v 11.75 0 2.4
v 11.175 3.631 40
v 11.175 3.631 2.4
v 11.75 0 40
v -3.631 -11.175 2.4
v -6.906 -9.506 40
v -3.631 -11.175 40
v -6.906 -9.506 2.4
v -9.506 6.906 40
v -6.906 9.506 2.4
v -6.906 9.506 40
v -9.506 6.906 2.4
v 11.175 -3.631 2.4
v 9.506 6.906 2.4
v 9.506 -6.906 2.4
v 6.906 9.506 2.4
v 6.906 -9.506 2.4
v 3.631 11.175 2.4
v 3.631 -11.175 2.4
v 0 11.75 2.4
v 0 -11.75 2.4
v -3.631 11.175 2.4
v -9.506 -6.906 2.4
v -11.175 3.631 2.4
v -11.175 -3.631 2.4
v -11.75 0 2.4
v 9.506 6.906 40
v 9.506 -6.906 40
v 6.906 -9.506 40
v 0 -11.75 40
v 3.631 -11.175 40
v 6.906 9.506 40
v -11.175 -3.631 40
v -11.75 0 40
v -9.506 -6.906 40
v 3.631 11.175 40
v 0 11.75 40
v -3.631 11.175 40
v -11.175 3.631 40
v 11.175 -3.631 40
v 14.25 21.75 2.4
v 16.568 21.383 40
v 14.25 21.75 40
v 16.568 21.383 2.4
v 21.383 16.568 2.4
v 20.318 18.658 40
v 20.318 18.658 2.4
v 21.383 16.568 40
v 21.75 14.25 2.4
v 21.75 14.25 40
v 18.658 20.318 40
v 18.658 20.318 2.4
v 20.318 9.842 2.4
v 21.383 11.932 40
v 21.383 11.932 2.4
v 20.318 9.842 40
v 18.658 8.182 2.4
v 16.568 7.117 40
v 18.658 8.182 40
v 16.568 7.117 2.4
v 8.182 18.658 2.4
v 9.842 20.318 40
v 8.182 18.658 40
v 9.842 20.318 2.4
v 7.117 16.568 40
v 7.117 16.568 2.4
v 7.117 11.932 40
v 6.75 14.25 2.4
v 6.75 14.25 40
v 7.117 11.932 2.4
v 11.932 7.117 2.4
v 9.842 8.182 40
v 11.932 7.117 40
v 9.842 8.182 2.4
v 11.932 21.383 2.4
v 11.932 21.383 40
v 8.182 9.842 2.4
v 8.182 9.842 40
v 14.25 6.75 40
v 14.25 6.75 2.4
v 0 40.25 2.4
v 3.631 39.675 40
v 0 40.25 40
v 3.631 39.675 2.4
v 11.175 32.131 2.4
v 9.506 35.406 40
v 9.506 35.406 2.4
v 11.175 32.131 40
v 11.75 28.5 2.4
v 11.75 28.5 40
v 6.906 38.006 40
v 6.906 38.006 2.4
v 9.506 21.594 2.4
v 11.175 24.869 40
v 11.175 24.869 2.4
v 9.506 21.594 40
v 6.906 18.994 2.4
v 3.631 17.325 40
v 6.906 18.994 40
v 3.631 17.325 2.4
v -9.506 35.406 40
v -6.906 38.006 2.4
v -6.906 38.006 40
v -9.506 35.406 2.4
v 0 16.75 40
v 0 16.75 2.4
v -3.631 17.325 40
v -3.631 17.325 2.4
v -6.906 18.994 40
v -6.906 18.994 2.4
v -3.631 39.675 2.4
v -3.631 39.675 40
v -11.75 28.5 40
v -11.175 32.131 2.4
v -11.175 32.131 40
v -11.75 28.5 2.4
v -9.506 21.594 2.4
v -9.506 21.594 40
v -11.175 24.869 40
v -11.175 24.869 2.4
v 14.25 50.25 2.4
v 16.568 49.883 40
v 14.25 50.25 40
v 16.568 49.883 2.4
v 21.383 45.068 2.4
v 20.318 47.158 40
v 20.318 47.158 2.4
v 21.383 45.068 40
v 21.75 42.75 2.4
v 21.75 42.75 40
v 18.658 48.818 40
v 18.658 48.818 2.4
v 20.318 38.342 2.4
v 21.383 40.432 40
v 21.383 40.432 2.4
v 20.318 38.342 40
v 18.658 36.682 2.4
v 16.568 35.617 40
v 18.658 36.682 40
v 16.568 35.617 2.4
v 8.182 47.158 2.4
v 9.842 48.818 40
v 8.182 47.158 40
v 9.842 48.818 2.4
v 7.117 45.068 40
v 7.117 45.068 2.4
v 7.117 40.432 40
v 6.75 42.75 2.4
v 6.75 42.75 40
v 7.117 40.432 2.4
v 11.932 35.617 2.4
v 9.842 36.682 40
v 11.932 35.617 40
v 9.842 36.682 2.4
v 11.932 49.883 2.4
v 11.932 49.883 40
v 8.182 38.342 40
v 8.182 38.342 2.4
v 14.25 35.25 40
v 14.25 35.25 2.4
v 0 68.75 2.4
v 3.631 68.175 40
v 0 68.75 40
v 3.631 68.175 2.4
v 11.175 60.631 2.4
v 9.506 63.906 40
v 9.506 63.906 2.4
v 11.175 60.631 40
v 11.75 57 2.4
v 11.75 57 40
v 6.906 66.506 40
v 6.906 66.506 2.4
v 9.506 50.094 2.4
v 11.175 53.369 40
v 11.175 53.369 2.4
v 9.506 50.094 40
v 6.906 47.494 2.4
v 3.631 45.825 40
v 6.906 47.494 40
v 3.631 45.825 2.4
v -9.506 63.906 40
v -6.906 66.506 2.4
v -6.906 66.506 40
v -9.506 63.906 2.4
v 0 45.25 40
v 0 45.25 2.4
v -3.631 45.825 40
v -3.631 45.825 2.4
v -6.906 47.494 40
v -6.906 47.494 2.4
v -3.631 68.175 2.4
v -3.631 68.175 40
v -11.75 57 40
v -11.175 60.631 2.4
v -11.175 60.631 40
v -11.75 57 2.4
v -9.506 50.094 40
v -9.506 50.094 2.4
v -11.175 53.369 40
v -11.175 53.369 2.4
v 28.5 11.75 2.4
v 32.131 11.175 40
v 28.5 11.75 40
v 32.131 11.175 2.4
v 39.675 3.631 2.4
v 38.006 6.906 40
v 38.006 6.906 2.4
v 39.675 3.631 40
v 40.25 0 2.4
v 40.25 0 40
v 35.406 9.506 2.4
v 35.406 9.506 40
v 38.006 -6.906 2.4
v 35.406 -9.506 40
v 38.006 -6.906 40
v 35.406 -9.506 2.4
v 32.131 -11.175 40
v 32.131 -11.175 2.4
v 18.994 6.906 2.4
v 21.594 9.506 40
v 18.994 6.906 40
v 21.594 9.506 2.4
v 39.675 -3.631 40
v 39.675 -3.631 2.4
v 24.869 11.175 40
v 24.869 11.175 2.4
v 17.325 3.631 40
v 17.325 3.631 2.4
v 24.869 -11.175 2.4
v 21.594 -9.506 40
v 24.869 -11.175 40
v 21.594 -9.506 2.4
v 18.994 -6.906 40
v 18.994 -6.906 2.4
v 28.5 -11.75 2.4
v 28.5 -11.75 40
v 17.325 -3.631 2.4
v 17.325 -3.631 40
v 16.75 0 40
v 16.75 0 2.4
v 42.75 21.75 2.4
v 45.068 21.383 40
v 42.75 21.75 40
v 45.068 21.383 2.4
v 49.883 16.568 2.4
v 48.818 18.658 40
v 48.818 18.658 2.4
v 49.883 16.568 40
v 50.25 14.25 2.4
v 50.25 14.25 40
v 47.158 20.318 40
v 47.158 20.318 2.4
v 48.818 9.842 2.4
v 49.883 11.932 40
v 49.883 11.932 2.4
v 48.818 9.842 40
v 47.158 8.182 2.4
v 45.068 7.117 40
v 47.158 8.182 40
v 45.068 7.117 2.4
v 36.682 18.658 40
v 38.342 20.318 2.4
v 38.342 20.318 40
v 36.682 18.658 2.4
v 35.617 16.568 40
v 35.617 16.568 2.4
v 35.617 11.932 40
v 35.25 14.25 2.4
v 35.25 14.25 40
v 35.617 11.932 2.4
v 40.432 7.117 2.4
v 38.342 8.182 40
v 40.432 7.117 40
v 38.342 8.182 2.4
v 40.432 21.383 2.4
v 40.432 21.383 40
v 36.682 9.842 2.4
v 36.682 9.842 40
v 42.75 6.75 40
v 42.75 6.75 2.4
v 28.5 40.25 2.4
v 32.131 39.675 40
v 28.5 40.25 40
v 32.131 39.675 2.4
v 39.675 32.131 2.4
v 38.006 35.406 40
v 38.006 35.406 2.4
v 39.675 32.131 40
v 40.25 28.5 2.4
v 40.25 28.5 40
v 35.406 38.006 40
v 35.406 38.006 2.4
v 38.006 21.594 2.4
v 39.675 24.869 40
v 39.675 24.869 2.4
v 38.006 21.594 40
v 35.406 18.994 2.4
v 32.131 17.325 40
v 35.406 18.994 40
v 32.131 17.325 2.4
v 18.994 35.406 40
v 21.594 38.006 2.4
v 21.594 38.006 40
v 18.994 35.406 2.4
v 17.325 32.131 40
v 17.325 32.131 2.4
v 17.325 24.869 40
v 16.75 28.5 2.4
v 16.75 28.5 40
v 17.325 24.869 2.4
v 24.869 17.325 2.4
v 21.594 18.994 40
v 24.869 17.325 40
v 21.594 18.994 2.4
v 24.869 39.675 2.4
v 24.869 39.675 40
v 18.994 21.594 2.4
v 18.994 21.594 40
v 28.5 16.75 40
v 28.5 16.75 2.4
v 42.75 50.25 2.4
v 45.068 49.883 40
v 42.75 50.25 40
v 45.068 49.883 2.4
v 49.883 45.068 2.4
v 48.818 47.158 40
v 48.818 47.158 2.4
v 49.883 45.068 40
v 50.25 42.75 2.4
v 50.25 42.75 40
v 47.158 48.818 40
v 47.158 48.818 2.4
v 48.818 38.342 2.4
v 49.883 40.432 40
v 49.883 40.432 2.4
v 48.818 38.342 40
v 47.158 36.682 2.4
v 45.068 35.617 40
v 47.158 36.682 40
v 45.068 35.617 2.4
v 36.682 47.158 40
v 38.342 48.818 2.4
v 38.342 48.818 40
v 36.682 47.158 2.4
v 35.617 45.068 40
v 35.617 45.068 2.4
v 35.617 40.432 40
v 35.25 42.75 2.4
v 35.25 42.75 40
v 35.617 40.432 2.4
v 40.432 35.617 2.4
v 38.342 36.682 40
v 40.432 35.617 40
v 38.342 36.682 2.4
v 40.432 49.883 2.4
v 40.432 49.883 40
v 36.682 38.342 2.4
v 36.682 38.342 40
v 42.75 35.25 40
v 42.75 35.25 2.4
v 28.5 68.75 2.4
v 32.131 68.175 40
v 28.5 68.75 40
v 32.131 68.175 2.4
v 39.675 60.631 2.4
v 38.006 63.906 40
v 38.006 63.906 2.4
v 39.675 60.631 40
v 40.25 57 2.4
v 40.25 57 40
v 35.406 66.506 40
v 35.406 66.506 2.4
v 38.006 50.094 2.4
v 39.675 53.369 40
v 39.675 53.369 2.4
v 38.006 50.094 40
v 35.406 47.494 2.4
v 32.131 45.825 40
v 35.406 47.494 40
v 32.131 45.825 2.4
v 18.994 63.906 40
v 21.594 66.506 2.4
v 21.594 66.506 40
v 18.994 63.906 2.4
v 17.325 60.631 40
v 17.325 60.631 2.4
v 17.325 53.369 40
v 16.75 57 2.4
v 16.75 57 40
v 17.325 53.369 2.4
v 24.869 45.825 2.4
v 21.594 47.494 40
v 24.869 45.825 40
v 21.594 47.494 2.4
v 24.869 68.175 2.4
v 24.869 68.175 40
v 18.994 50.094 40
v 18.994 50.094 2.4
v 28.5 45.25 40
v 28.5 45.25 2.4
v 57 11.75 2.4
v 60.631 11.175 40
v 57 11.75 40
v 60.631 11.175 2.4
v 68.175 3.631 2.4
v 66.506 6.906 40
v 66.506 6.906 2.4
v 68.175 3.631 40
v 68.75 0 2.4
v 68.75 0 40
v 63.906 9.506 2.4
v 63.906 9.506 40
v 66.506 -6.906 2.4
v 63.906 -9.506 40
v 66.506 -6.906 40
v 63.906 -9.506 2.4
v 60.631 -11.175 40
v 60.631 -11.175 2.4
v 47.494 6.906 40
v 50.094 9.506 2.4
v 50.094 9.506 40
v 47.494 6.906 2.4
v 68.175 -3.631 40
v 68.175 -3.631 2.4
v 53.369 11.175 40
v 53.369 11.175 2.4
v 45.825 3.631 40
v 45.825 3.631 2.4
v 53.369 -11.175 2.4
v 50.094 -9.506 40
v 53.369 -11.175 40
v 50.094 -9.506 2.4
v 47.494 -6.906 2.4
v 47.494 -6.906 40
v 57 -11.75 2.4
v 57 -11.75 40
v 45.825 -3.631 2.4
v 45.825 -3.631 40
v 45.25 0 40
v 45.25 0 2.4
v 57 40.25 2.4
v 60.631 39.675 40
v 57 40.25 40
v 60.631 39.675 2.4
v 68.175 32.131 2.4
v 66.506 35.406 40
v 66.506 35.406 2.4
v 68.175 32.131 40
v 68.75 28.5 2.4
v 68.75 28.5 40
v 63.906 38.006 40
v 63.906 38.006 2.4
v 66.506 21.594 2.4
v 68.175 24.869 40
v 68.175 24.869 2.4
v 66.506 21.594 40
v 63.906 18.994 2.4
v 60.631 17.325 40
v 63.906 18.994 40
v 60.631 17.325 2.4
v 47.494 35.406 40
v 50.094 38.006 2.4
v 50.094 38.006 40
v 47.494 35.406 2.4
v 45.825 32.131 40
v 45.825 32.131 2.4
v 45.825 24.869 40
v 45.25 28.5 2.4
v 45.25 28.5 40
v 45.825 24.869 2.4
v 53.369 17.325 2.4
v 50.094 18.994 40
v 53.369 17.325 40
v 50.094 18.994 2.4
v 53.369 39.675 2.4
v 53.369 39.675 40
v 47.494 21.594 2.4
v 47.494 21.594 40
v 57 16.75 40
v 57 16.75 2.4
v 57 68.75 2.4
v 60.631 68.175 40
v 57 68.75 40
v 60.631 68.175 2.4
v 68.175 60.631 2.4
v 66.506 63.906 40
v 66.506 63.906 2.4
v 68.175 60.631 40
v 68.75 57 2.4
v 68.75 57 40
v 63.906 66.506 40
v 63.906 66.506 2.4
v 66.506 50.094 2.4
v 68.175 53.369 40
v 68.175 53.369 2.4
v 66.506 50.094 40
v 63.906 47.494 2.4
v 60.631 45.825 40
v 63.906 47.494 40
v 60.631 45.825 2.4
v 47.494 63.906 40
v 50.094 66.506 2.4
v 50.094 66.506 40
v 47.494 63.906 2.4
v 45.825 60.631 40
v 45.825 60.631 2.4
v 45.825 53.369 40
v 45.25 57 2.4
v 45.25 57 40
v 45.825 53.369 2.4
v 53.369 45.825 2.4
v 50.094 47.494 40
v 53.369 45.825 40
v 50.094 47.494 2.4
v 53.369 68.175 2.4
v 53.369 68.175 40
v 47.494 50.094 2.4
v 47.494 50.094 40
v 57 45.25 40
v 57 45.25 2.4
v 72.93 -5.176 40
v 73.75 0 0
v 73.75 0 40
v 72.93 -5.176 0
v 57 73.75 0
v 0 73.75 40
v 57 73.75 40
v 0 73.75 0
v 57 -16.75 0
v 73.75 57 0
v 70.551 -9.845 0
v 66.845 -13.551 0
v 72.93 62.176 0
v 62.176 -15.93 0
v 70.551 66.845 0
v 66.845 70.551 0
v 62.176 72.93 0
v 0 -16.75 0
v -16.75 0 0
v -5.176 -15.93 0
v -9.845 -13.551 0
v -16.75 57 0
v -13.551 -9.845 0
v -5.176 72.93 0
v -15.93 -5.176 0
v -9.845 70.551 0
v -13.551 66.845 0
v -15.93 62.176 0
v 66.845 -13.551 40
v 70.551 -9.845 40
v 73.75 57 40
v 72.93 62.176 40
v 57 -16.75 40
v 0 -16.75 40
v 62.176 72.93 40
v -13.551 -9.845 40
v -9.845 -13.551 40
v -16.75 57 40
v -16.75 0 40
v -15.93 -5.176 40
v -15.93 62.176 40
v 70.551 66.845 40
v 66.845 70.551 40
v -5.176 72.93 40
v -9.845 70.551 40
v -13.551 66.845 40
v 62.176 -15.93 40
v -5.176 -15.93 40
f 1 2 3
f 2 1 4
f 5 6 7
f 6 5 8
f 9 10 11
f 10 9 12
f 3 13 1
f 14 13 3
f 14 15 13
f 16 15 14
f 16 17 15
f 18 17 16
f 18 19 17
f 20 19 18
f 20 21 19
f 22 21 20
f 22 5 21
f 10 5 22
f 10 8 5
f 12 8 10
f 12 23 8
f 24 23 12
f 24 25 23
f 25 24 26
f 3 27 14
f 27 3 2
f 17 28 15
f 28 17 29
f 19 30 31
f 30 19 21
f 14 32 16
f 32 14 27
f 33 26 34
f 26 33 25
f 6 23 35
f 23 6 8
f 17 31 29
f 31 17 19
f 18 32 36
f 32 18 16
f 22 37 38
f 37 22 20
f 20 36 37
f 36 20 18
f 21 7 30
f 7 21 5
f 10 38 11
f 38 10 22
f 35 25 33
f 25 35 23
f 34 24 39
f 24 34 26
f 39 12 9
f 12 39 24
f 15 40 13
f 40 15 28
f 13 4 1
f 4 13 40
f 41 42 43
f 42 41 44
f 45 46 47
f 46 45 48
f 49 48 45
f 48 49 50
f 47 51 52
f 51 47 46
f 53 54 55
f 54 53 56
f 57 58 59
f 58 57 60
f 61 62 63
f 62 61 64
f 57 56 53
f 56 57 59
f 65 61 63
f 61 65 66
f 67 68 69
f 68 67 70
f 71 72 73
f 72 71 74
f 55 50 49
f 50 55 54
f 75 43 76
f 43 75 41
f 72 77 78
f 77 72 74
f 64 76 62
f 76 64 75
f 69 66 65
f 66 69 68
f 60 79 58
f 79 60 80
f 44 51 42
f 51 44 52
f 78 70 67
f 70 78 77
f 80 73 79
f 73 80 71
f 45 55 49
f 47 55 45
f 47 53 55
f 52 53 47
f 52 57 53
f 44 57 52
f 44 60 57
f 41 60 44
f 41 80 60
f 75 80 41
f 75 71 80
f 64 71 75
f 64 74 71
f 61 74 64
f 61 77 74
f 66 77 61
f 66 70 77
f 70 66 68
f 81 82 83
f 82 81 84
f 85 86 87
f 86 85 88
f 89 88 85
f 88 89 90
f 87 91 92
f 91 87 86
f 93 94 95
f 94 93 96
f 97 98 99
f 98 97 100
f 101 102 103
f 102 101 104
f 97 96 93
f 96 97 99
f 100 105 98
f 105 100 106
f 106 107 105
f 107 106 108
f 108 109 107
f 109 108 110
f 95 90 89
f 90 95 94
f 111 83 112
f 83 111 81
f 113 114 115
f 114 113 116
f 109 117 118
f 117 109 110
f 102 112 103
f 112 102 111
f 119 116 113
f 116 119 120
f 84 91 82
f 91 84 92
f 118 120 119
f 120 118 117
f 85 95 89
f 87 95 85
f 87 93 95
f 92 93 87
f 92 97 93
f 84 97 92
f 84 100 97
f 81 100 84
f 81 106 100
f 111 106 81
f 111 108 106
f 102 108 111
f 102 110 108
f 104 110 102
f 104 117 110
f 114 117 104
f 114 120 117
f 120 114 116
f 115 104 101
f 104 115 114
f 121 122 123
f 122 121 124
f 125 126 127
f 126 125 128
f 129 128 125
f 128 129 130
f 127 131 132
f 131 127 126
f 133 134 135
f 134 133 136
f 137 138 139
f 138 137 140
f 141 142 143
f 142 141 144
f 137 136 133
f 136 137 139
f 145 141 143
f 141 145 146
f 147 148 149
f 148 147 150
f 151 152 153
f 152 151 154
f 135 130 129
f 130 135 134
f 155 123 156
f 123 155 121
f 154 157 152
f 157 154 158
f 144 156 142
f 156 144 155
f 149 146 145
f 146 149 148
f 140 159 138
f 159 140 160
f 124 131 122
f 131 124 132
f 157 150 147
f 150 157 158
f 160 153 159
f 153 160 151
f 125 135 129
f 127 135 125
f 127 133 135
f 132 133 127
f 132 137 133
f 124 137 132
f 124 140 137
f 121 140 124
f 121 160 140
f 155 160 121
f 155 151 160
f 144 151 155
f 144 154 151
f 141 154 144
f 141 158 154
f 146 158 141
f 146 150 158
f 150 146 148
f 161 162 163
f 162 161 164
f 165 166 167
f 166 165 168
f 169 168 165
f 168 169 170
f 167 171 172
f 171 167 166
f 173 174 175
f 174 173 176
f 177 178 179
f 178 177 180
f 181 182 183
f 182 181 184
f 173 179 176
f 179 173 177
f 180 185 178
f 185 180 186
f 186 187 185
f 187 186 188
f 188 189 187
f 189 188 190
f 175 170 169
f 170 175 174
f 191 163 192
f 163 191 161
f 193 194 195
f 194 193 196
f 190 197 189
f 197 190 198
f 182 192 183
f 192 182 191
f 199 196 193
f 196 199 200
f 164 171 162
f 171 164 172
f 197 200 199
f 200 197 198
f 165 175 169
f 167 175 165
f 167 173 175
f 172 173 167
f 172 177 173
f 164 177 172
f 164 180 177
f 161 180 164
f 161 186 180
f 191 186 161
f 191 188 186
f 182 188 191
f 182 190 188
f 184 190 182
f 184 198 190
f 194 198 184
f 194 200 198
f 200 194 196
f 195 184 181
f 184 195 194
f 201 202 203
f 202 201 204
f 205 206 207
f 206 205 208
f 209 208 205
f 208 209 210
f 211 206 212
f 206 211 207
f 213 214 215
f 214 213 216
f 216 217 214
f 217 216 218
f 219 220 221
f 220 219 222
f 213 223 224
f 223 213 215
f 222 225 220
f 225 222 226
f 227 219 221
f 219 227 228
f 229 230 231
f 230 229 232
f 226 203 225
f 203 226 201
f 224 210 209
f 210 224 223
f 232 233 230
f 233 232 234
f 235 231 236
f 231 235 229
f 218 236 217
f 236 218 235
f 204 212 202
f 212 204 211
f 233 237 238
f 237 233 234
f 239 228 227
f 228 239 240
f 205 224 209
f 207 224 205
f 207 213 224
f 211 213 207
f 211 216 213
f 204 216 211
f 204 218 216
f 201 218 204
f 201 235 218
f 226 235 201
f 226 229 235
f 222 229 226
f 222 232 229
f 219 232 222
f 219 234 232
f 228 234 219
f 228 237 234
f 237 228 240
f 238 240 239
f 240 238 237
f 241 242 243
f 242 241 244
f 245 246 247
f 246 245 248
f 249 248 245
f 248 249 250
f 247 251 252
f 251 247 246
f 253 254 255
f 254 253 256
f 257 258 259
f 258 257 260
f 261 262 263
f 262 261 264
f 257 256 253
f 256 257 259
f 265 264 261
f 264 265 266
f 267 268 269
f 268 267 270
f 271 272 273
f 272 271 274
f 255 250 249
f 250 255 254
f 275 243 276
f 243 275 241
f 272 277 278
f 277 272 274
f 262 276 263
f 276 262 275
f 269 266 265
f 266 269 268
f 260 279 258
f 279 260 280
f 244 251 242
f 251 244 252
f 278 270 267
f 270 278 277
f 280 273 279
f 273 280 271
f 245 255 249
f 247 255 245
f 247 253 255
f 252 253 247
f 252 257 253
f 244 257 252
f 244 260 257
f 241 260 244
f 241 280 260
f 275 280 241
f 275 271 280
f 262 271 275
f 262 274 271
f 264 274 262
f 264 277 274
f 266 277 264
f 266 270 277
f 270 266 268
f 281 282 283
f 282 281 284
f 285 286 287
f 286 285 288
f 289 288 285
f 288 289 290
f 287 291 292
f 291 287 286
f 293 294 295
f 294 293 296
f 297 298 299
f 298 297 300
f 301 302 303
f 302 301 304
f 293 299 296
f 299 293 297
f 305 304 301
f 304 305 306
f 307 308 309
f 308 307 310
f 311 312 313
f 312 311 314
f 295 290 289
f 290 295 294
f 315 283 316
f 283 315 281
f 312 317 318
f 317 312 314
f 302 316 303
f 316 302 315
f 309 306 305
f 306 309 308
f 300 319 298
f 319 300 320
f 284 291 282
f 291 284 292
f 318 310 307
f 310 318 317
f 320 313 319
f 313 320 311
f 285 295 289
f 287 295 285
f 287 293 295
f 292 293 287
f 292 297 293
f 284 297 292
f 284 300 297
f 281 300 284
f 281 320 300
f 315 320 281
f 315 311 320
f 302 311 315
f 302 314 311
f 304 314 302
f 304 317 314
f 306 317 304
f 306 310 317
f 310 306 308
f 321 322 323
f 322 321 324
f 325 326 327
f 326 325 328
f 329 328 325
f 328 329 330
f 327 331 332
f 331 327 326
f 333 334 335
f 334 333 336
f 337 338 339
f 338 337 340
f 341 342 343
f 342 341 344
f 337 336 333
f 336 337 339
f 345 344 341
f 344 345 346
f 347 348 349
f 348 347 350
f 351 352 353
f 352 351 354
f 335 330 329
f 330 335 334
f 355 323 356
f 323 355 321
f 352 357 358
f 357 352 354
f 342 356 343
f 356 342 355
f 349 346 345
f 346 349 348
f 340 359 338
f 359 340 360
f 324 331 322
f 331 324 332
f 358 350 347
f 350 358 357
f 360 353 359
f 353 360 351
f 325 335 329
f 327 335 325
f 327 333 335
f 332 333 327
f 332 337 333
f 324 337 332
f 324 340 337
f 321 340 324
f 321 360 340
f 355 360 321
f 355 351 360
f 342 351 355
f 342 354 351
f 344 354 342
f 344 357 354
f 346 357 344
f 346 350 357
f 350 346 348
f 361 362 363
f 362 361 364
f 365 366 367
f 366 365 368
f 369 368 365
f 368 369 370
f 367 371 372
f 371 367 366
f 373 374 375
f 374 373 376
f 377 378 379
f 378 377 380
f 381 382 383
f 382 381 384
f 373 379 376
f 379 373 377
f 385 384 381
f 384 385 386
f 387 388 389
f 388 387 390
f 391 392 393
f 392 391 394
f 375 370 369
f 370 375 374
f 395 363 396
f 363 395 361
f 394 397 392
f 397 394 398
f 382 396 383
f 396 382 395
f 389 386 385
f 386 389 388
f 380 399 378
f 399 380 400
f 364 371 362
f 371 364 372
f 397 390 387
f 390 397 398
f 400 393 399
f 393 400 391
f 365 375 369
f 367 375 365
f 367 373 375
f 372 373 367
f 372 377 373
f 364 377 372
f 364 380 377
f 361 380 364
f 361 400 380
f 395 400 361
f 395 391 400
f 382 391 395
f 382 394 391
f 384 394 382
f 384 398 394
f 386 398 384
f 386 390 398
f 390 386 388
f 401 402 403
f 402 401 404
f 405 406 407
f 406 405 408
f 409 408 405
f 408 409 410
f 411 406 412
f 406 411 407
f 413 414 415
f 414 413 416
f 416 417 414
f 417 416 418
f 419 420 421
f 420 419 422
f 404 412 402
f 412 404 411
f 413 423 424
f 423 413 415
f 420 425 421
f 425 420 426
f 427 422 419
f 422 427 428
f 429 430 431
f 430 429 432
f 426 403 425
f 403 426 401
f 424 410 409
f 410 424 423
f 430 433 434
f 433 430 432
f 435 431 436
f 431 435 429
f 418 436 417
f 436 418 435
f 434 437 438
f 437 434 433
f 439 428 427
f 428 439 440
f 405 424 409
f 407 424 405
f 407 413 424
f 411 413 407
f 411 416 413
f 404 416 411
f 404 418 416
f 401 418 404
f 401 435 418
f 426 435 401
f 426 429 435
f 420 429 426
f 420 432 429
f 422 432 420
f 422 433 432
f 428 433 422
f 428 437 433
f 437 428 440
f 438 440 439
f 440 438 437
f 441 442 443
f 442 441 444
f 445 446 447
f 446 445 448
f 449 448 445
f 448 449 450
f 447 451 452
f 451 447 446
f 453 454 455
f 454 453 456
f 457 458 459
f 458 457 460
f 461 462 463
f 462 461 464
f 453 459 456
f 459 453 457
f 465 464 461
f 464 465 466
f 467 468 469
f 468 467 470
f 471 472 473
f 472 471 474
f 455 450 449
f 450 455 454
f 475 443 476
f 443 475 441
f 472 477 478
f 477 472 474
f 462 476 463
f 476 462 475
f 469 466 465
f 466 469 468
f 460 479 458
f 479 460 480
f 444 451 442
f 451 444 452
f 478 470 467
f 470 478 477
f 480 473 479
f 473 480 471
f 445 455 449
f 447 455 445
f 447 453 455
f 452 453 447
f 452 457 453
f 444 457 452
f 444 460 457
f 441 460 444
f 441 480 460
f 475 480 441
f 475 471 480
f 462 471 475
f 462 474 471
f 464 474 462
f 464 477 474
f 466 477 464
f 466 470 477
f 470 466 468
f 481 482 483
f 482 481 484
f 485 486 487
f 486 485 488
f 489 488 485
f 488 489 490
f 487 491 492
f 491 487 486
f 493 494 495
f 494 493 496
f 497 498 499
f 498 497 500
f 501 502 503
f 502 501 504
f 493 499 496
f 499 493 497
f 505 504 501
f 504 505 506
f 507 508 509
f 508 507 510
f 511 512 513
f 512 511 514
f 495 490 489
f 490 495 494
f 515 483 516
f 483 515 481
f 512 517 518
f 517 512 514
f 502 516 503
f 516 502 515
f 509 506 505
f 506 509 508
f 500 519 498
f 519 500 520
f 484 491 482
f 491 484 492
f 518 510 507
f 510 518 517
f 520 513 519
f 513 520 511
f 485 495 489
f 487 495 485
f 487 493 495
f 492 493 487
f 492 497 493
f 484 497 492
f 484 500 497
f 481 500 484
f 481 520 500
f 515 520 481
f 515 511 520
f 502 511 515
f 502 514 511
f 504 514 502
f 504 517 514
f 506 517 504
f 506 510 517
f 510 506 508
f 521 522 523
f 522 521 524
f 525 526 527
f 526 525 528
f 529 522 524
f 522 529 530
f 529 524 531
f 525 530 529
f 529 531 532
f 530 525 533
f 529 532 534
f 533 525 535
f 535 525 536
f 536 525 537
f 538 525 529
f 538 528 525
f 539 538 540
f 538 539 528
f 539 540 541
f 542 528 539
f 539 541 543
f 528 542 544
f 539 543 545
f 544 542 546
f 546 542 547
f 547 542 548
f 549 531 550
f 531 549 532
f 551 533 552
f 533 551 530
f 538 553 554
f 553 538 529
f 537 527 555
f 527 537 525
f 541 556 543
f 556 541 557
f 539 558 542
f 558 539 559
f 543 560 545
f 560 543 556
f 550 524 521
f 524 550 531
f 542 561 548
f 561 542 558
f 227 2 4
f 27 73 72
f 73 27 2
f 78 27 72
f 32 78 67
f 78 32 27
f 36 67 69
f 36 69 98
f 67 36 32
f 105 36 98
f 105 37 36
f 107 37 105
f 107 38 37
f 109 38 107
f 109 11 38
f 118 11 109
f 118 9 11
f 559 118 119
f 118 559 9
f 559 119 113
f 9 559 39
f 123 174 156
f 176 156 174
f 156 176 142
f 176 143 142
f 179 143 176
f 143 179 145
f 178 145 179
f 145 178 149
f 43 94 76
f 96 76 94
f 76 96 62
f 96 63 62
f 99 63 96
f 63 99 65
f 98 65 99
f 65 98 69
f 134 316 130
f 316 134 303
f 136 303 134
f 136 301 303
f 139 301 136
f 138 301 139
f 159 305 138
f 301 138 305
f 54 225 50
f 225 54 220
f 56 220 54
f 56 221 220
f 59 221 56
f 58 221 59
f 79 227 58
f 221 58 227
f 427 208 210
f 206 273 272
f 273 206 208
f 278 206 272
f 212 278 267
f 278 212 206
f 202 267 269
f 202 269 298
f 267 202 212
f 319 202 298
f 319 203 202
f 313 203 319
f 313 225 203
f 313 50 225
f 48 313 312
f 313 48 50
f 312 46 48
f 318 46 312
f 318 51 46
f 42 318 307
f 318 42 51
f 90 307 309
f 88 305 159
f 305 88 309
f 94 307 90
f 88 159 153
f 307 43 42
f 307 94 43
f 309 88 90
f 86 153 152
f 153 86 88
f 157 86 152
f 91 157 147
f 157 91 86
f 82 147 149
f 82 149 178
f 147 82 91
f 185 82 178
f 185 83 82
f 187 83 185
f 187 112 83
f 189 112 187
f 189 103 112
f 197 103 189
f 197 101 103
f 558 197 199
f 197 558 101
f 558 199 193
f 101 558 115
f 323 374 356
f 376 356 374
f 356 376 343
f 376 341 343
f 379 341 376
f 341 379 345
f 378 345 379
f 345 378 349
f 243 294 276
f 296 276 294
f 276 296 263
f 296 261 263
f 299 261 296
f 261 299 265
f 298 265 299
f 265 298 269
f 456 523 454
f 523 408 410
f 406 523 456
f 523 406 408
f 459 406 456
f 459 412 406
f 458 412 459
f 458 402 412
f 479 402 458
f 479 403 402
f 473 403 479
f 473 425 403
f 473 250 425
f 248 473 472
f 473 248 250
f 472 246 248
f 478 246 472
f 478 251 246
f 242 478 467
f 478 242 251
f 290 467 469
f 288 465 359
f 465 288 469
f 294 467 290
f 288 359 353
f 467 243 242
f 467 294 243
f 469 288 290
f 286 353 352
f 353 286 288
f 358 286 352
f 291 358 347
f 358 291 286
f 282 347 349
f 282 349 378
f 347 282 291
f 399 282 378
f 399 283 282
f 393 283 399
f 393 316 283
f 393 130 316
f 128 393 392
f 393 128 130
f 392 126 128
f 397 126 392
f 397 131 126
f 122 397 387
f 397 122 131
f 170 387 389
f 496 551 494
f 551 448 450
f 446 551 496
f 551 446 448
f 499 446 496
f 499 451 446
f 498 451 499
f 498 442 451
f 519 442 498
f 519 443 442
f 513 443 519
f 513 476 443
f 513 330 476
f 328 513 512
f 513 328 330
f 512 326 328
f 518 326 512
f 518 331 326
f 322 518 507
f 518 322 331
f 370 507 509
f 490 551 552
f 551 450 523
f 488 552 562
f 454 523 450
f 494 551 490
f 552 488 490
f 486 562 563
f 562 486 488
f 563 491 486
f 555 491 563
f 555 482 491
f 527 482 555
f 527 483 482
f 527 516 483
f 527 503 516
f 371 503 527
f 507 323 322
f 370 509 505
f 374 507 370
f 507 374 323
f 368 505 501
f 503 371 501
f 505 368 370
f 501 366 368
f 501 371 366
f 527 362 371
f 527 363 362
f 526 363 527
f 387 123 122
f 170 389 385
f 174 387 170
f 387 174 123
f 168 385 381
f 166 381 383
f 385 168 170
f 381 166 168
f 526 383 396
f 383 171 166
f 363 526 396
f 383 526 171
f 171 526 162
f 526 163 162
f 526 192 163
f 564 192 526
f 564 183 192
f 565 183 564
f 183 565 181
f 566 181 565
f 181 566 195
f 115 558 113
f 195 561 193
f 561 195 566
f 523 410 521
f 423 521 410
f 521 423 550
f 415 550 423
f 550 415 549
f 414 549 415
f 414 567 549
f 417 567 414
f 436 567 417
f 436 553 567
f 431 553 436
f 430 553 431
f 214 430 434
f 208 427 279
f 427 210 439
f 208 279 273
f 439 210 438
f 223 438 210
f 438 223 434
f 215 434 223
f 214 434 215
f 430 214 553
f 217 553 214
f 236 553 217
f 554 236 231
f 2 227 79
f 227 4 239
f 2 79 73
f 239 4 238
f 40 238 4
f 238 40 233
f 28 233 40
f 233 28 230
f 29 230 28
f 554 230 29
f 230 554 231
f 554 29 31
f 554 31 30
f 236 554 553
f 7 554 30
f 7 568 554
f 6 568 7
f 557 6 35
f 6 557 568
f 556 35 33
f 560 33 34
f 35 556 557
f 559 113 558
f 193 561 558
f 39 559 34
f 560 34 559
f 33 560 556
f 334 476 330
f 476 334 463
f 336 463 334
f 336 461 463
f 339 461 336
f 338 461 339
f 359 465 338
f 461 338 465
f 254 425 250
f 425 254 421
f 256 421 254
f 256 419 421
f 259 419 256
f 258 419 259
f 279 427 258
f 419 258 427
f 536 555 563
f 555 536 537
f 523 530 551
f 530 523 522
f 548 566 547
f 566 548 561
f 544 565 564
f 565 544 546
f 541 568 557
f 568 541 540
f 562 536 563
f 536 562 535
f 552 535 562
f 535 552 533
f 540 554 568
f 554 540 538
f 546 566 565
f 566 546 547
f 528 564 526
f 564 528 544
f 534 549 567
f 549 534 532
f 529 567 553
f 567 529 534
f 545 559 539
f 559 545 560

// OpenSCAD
//hållare för Vaporisers och e-liquids
module vapebottleholder(d1,x,y,spacing,h1,hbottom,vapeholediam,q)
{
$fn=q;

d2 = d1+(spacing*2);

h2=h1*2;

holeoffset = d1 +spacing;
holeoffset2 =  -(d1/2+ spacing/2);

shelloffsetx=(x-1) *(d1+spacing);
shelloffsety=(y-1) *(d1+spacing);;

difference(){

	hull(){
		cylinder(r=d2/2,h=h1);

		translate([shelloffsety,0, 0])	
		cylinder(r=d2/2,h=h1);
		
		translate([shelloffsety,shelloffsetx, 0])	
		cylinder(r=d2/2,h=h1);
		
		translate([0,shelloffsetx, 0])	
		cylinder(r=d2/2,h=h1);
	}

	for ( iy = [1 : y] ) 
	{
		for ( ix = [1 : x] ) 
		{
			translate([(iy-1)*holeoffset, (ix-1)*holeoffset, hbottom])
			cylinder(r=d1/2,h=h2);
			
			if(iy<y && ix<x && vapeholediam>0){
			translate([(iy)*holeoffset + holeoffset2, (ix)*holeoffset+holeoffset2, hbottom])
			cylinder(r=vapeholediam/2,h=h2);
			}			
		}
	}
}

}

//v1 vapebottleholder(23.5,2,2,2.5,12,2.4, 100);
//kommentar v1: vaporizern sitter slappt.
//v2: vapebottleholder(d1=23.5,x=3,y=3,spacing=5,h1=13,hbottom=2.4,vapeholediam=15.25,q=100);
//kommentar v2: fortfarande lite för stort hål, lite för låg höjd på lådan.
vapebottleholder(d1=23.5,x=3,y=3,spacing=5,h1=40,hbottom=2.4,vapeholediam=15,q=20);
//vapebottleholder(d1=18.5,x=3,y=5,spacing=5,h1=40,hbottom=2.4,vapeholediam=2,q=50);
